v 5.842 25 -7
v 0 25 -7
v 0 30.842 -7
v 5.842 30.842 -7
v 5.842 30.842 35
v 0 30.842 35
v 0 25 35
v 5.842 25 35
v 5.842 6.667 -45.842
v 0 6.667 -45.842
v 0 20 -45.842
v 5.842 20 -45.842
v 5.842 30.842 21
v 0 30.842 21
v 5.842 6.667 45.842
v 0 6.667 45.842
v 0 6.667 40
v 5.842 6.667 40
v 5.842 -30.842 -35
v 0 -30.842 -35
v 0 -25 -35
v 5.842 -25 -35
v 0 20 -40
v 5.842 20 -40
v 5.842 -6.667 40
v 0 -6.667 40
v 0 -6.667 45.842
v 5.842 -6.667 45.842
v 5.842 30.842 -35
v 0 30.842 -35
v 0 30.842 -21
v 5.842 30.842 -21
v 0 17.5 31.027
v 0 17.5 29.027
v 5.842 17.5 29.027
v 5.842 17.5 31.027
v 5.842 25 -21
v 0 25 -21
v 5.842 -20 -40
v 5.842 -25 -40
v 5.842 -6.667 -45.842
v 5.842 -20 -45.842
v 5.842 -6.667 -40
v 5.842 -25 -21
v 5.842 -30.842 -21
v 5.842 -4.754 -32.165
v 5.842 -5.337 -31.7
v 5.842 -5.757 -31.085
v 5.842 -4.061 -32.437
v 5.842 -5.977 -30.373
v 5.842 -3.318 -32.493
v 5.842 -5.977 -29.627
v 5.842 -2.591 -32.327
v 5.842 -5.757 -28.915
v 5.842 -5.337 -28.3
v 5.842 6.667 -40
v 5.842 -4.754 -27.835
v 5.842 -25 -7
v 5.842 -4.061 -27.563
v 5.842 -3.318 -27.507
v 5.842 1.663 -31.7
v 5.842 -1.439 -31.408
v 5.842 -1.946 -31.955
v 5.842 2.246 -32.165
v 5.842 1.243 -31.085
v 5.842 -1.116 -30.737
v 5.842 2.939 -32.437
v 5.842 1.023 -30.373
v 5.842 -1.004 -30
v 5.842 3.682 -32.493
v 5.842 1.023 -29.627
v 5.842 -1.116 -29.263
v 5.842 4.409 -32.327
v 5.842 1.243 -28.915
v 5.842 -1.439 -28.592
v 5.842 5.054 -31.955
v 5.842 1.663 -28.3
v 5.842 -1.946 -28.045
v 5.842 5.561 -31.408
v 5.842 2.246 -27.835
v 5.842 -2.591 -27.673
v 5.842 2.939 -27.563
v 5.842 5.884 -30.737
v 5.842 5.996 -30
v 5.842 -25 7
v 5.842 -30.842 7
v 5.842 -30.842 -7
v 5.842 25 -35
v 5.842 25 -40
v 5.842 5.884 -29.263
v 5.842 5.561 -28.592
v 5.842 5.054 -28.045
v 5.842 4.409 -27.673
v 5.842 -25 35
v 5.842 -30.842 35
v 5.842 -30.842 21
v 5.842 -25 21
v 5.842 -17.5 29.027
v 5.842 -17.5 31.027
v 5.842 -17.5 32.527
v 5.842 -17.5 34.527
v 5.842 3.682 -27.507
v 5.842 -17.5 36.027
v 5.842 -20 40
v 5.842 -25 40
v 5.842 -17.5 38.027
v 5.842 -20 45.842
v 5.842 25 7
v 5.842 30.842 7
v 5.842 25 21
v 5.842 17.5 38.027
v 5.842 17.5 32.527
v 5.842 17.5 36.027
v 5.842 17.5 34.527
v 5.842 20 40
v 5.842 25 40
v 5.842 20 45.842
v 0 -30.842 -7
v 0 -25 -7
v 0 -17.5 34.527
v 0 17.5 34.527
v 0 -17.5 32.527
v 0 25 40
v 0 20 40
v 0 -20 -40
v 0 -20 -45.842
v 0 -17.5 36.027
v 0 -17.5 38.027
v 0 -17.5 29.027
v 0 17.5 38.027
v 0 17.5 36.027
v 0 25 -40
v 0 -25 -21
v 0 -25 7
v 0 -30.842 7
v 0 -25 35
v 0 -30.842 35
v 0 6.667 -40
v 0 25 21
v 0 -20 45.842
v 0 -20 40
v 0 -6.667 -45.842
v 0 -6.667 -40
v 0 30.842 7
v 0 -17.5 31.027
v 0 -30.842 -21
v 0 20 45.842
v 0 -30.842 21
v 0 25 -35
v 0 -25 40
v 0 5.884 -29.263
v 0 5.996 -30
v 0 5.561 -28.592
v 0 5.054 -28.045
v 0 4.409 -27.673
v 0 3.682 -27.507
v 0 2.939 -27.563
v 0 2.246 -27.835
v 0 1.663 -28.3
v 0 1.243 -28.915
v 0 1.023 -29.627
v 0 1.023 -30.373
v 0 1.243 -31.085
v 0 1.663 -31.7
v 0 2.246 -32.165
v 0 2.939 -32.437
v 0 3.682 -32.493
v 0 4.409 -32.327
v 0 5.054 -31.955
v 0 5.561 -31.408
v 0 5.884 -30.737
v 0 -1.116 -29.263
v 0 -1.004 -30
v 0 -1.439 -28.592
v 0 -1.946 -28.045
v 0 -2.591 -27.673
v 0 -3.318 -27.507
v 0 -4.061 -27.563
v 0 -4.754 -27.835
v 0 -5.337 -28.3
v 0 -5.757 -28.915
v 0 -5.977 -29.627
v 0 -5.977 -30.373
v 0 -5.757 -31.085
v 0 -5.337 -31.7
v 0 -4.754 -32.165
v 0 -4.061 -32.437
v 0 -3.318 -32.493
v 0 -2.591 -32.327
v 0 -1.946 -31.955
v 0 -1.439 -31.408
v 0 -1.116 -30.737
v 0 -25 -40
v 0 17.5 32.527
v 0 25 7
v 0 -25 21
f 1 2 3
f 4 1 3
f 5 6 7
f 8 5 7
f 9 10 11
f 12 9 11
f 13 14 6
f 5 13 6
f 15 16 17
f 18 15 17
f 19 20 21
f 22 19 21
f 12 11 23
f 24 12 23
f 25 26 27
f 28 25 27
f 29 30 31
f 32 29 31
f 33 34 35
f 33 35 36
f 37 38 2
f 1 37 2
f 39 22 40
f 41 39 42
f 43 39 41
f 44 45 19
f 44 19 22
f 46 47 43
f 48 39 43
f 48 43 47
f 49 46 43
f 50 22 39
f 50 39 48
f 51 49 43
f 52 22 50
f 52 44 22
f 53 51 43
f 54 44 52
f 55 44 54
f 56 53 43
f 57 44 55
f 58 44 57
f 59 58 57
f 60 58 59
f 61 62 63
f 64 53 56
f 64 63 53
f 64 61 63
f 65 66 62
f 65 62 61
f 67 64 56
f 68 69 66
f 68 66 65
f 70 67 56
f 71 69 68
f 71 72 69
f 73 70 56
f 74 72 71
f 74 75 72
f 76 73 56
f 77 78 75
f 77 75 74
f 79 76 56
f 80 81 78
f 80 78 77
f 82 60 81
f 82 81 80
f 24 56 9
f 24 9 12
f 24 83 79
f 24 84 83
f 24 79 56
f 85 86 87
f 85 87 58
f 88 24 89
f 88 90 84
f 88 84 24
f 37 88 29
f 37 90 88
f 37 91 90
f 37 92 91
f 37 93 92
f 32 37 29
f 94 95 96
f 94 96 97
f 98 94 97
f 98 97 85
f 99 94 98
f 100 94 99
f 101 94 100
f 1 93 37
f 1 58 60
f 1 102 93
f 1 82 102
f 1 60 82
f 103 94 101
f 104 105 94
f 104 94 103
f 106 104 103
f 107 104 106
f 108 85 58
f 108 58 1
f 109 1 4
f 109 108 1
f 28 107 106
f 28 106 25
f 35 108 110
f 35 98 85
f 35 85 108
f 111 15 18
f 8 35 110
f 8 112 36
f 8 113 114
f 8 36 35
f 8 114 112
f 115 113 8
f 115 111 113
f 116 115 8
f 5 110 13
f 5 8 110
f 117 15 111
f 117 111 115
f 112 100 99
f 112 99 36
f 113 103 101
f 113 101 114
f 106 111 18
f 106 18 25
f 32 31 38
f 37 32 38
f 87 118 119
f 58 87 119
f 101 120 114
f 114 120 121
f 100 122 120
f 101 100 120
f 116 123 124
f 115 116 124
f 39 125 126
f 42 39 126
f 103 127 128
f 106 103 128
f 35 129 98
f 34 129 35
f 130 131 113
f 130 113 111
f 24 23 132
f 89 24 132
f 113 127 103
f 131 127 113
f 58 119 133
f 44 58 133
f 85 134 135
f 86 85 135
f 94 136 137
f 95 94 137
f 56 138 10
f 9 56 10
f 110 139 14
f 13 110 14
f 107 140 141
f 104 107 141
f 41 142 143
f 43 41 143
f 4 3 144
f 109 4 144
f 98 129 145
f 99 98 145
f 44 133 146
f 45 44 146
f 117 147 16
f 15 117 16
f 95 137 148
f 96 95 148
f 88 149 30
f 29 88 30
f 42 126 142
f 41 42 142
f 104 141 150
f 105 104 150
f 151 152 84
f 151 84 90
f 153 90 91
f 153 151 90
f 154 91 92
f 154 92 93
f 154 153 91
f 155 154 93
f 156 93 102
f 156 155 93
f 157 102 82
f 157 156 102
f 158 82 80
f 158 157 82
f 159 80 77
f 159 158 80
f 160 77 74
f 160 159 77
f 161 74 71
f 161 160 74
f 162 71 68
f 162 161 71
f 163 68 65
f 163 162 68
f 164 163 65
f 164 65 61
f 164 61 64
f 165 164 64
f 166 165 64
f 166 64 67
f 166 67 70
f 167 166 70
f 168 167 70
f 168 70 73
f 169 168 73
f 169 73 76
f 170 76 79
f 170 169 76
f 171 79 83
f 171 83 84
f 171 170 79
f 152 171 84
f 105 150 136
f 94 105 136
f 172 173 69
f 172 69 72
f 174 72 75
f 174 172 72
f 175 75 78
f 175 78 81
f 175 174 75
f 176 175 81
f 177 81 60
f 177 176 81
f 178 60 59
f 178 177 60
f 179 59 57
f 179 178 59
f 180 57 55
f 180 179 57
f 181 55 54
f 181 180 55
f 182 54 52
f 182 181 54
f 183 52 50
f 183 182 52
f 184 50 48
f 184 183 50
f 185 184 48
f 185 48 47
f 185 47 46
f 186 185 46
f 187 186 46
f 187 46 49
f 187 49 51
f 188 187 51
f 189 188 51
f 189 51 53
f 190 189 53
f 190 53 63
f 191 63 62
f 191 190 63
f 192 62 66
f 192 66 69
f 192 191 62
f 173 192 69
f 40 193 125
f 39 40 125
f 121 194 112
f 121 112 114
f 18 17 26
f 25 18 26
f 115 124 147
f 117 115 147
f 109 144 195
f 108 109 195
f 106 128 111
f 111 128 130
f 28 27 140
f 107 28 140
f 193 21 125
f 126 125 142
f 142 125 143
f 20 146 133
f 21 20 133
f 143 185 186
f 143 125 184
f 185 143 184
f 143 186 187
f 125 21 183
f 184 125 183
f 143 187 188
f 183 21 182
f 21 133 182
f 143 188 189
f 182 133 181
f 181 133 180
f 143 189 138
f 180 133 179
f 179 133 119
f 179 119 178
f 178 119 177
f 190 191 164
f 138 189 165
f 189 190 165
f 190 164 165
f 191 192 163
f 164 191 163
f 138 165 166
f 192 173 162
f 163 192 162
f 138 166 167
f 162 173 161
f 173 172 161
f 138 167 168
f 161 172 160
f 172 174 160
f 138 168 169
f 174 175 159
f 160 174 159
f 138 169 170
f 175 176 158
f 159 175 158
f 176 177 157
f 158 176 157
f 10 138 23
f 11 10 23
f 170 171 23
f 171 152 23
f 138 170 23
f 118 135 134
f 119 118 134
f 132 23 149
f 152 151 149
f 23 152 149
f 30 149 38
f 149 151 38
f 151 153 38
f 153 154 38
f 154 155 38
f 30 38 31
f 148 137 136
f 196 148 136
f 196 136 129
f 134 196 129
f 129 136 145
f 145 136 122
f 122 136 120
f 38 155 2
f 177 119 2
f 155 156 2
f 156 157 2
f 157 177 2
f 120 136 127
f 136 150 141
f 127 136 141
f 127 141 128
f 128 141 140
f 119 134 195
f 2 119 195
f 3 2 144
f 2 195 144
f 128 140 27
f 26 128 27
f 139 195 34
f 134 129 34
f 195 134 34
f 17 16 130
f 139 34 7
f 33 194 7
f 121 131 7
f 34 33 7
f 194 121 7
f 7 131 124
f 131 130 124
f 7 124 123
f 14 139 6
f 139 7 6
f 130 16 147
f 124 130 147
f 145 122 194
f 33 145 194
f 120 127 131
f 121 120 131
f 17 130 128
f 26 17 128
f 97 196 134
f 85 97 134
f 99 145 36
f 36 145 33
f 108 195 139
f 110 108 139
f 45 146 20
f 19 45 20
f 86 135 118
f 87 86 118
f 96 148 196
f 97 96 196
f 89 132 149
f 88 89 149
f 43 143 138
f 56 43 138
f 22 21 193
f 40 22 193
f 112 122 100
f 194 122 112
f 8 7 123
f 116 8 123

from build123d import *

# Parameters (mm, degrees)
F0_R     = 2.5
F0_W     = 35
F0_H     = 2
F1_DEPTH = 5.842


with BuildPart() as f1:
    # F0 (on Right) → F1 (new body)
    with BuildSketch(Plane.YZ):
        Polygon((-25, -35), (-25, -40), (-20, -40), (-20, -45.842), (-6.666667, -45.842), (-6.666667, -40), (6.666667, -40), (6.666667, -45.842), (20, -45.842), (20, -40), (25, -40), (25, -35), (30.842, -35), (30.842, -21), (25, -21), (25, -7), (30.842, -7), (30.842, 7), (25, 7), (25, 21), (30.842, 21), (30.842, 35), (25, 35), (25, 40), (20, 40), (20, 45.842), (6.666667, 45.842), (6.666667, 40), (-6.666667, 40), (-6.666667, 45.842), (-20, 45.842), (-20, 40), (-25, 40), (-25, 35), (-30.842, 35), (-30.842, 21), (-25, 21), (-25, 7), (-30.842, 7), (-30.842, -7), (-25, -7), (-25, -21), (-30.842, -21), (-30.842, -35), align=None)
        with Locations((-3.50444, -30)):
            Circle(F0_R, mode=Mode.SUBTRACT)
        with Locations((3.49556, -30)):
            Circle(F0_R, mode=Mode.SUBTRACT)
        with Locations((0, 30.027077)):
            Rectangle(F0_W, F0_H, mode=Mode.SUBTRACT)
        with Locations((0, 33.527077)):
            Rectangle(F0_W, F0_H, mode=Mode.SUBTRACT)
        with Locations((0, 37.027077)):
            Rectangle(F0_W, F0_H, mode=Mode.SUBTRACT)
    extrude(amount=F1_DEPTH)


solid = f1.part
